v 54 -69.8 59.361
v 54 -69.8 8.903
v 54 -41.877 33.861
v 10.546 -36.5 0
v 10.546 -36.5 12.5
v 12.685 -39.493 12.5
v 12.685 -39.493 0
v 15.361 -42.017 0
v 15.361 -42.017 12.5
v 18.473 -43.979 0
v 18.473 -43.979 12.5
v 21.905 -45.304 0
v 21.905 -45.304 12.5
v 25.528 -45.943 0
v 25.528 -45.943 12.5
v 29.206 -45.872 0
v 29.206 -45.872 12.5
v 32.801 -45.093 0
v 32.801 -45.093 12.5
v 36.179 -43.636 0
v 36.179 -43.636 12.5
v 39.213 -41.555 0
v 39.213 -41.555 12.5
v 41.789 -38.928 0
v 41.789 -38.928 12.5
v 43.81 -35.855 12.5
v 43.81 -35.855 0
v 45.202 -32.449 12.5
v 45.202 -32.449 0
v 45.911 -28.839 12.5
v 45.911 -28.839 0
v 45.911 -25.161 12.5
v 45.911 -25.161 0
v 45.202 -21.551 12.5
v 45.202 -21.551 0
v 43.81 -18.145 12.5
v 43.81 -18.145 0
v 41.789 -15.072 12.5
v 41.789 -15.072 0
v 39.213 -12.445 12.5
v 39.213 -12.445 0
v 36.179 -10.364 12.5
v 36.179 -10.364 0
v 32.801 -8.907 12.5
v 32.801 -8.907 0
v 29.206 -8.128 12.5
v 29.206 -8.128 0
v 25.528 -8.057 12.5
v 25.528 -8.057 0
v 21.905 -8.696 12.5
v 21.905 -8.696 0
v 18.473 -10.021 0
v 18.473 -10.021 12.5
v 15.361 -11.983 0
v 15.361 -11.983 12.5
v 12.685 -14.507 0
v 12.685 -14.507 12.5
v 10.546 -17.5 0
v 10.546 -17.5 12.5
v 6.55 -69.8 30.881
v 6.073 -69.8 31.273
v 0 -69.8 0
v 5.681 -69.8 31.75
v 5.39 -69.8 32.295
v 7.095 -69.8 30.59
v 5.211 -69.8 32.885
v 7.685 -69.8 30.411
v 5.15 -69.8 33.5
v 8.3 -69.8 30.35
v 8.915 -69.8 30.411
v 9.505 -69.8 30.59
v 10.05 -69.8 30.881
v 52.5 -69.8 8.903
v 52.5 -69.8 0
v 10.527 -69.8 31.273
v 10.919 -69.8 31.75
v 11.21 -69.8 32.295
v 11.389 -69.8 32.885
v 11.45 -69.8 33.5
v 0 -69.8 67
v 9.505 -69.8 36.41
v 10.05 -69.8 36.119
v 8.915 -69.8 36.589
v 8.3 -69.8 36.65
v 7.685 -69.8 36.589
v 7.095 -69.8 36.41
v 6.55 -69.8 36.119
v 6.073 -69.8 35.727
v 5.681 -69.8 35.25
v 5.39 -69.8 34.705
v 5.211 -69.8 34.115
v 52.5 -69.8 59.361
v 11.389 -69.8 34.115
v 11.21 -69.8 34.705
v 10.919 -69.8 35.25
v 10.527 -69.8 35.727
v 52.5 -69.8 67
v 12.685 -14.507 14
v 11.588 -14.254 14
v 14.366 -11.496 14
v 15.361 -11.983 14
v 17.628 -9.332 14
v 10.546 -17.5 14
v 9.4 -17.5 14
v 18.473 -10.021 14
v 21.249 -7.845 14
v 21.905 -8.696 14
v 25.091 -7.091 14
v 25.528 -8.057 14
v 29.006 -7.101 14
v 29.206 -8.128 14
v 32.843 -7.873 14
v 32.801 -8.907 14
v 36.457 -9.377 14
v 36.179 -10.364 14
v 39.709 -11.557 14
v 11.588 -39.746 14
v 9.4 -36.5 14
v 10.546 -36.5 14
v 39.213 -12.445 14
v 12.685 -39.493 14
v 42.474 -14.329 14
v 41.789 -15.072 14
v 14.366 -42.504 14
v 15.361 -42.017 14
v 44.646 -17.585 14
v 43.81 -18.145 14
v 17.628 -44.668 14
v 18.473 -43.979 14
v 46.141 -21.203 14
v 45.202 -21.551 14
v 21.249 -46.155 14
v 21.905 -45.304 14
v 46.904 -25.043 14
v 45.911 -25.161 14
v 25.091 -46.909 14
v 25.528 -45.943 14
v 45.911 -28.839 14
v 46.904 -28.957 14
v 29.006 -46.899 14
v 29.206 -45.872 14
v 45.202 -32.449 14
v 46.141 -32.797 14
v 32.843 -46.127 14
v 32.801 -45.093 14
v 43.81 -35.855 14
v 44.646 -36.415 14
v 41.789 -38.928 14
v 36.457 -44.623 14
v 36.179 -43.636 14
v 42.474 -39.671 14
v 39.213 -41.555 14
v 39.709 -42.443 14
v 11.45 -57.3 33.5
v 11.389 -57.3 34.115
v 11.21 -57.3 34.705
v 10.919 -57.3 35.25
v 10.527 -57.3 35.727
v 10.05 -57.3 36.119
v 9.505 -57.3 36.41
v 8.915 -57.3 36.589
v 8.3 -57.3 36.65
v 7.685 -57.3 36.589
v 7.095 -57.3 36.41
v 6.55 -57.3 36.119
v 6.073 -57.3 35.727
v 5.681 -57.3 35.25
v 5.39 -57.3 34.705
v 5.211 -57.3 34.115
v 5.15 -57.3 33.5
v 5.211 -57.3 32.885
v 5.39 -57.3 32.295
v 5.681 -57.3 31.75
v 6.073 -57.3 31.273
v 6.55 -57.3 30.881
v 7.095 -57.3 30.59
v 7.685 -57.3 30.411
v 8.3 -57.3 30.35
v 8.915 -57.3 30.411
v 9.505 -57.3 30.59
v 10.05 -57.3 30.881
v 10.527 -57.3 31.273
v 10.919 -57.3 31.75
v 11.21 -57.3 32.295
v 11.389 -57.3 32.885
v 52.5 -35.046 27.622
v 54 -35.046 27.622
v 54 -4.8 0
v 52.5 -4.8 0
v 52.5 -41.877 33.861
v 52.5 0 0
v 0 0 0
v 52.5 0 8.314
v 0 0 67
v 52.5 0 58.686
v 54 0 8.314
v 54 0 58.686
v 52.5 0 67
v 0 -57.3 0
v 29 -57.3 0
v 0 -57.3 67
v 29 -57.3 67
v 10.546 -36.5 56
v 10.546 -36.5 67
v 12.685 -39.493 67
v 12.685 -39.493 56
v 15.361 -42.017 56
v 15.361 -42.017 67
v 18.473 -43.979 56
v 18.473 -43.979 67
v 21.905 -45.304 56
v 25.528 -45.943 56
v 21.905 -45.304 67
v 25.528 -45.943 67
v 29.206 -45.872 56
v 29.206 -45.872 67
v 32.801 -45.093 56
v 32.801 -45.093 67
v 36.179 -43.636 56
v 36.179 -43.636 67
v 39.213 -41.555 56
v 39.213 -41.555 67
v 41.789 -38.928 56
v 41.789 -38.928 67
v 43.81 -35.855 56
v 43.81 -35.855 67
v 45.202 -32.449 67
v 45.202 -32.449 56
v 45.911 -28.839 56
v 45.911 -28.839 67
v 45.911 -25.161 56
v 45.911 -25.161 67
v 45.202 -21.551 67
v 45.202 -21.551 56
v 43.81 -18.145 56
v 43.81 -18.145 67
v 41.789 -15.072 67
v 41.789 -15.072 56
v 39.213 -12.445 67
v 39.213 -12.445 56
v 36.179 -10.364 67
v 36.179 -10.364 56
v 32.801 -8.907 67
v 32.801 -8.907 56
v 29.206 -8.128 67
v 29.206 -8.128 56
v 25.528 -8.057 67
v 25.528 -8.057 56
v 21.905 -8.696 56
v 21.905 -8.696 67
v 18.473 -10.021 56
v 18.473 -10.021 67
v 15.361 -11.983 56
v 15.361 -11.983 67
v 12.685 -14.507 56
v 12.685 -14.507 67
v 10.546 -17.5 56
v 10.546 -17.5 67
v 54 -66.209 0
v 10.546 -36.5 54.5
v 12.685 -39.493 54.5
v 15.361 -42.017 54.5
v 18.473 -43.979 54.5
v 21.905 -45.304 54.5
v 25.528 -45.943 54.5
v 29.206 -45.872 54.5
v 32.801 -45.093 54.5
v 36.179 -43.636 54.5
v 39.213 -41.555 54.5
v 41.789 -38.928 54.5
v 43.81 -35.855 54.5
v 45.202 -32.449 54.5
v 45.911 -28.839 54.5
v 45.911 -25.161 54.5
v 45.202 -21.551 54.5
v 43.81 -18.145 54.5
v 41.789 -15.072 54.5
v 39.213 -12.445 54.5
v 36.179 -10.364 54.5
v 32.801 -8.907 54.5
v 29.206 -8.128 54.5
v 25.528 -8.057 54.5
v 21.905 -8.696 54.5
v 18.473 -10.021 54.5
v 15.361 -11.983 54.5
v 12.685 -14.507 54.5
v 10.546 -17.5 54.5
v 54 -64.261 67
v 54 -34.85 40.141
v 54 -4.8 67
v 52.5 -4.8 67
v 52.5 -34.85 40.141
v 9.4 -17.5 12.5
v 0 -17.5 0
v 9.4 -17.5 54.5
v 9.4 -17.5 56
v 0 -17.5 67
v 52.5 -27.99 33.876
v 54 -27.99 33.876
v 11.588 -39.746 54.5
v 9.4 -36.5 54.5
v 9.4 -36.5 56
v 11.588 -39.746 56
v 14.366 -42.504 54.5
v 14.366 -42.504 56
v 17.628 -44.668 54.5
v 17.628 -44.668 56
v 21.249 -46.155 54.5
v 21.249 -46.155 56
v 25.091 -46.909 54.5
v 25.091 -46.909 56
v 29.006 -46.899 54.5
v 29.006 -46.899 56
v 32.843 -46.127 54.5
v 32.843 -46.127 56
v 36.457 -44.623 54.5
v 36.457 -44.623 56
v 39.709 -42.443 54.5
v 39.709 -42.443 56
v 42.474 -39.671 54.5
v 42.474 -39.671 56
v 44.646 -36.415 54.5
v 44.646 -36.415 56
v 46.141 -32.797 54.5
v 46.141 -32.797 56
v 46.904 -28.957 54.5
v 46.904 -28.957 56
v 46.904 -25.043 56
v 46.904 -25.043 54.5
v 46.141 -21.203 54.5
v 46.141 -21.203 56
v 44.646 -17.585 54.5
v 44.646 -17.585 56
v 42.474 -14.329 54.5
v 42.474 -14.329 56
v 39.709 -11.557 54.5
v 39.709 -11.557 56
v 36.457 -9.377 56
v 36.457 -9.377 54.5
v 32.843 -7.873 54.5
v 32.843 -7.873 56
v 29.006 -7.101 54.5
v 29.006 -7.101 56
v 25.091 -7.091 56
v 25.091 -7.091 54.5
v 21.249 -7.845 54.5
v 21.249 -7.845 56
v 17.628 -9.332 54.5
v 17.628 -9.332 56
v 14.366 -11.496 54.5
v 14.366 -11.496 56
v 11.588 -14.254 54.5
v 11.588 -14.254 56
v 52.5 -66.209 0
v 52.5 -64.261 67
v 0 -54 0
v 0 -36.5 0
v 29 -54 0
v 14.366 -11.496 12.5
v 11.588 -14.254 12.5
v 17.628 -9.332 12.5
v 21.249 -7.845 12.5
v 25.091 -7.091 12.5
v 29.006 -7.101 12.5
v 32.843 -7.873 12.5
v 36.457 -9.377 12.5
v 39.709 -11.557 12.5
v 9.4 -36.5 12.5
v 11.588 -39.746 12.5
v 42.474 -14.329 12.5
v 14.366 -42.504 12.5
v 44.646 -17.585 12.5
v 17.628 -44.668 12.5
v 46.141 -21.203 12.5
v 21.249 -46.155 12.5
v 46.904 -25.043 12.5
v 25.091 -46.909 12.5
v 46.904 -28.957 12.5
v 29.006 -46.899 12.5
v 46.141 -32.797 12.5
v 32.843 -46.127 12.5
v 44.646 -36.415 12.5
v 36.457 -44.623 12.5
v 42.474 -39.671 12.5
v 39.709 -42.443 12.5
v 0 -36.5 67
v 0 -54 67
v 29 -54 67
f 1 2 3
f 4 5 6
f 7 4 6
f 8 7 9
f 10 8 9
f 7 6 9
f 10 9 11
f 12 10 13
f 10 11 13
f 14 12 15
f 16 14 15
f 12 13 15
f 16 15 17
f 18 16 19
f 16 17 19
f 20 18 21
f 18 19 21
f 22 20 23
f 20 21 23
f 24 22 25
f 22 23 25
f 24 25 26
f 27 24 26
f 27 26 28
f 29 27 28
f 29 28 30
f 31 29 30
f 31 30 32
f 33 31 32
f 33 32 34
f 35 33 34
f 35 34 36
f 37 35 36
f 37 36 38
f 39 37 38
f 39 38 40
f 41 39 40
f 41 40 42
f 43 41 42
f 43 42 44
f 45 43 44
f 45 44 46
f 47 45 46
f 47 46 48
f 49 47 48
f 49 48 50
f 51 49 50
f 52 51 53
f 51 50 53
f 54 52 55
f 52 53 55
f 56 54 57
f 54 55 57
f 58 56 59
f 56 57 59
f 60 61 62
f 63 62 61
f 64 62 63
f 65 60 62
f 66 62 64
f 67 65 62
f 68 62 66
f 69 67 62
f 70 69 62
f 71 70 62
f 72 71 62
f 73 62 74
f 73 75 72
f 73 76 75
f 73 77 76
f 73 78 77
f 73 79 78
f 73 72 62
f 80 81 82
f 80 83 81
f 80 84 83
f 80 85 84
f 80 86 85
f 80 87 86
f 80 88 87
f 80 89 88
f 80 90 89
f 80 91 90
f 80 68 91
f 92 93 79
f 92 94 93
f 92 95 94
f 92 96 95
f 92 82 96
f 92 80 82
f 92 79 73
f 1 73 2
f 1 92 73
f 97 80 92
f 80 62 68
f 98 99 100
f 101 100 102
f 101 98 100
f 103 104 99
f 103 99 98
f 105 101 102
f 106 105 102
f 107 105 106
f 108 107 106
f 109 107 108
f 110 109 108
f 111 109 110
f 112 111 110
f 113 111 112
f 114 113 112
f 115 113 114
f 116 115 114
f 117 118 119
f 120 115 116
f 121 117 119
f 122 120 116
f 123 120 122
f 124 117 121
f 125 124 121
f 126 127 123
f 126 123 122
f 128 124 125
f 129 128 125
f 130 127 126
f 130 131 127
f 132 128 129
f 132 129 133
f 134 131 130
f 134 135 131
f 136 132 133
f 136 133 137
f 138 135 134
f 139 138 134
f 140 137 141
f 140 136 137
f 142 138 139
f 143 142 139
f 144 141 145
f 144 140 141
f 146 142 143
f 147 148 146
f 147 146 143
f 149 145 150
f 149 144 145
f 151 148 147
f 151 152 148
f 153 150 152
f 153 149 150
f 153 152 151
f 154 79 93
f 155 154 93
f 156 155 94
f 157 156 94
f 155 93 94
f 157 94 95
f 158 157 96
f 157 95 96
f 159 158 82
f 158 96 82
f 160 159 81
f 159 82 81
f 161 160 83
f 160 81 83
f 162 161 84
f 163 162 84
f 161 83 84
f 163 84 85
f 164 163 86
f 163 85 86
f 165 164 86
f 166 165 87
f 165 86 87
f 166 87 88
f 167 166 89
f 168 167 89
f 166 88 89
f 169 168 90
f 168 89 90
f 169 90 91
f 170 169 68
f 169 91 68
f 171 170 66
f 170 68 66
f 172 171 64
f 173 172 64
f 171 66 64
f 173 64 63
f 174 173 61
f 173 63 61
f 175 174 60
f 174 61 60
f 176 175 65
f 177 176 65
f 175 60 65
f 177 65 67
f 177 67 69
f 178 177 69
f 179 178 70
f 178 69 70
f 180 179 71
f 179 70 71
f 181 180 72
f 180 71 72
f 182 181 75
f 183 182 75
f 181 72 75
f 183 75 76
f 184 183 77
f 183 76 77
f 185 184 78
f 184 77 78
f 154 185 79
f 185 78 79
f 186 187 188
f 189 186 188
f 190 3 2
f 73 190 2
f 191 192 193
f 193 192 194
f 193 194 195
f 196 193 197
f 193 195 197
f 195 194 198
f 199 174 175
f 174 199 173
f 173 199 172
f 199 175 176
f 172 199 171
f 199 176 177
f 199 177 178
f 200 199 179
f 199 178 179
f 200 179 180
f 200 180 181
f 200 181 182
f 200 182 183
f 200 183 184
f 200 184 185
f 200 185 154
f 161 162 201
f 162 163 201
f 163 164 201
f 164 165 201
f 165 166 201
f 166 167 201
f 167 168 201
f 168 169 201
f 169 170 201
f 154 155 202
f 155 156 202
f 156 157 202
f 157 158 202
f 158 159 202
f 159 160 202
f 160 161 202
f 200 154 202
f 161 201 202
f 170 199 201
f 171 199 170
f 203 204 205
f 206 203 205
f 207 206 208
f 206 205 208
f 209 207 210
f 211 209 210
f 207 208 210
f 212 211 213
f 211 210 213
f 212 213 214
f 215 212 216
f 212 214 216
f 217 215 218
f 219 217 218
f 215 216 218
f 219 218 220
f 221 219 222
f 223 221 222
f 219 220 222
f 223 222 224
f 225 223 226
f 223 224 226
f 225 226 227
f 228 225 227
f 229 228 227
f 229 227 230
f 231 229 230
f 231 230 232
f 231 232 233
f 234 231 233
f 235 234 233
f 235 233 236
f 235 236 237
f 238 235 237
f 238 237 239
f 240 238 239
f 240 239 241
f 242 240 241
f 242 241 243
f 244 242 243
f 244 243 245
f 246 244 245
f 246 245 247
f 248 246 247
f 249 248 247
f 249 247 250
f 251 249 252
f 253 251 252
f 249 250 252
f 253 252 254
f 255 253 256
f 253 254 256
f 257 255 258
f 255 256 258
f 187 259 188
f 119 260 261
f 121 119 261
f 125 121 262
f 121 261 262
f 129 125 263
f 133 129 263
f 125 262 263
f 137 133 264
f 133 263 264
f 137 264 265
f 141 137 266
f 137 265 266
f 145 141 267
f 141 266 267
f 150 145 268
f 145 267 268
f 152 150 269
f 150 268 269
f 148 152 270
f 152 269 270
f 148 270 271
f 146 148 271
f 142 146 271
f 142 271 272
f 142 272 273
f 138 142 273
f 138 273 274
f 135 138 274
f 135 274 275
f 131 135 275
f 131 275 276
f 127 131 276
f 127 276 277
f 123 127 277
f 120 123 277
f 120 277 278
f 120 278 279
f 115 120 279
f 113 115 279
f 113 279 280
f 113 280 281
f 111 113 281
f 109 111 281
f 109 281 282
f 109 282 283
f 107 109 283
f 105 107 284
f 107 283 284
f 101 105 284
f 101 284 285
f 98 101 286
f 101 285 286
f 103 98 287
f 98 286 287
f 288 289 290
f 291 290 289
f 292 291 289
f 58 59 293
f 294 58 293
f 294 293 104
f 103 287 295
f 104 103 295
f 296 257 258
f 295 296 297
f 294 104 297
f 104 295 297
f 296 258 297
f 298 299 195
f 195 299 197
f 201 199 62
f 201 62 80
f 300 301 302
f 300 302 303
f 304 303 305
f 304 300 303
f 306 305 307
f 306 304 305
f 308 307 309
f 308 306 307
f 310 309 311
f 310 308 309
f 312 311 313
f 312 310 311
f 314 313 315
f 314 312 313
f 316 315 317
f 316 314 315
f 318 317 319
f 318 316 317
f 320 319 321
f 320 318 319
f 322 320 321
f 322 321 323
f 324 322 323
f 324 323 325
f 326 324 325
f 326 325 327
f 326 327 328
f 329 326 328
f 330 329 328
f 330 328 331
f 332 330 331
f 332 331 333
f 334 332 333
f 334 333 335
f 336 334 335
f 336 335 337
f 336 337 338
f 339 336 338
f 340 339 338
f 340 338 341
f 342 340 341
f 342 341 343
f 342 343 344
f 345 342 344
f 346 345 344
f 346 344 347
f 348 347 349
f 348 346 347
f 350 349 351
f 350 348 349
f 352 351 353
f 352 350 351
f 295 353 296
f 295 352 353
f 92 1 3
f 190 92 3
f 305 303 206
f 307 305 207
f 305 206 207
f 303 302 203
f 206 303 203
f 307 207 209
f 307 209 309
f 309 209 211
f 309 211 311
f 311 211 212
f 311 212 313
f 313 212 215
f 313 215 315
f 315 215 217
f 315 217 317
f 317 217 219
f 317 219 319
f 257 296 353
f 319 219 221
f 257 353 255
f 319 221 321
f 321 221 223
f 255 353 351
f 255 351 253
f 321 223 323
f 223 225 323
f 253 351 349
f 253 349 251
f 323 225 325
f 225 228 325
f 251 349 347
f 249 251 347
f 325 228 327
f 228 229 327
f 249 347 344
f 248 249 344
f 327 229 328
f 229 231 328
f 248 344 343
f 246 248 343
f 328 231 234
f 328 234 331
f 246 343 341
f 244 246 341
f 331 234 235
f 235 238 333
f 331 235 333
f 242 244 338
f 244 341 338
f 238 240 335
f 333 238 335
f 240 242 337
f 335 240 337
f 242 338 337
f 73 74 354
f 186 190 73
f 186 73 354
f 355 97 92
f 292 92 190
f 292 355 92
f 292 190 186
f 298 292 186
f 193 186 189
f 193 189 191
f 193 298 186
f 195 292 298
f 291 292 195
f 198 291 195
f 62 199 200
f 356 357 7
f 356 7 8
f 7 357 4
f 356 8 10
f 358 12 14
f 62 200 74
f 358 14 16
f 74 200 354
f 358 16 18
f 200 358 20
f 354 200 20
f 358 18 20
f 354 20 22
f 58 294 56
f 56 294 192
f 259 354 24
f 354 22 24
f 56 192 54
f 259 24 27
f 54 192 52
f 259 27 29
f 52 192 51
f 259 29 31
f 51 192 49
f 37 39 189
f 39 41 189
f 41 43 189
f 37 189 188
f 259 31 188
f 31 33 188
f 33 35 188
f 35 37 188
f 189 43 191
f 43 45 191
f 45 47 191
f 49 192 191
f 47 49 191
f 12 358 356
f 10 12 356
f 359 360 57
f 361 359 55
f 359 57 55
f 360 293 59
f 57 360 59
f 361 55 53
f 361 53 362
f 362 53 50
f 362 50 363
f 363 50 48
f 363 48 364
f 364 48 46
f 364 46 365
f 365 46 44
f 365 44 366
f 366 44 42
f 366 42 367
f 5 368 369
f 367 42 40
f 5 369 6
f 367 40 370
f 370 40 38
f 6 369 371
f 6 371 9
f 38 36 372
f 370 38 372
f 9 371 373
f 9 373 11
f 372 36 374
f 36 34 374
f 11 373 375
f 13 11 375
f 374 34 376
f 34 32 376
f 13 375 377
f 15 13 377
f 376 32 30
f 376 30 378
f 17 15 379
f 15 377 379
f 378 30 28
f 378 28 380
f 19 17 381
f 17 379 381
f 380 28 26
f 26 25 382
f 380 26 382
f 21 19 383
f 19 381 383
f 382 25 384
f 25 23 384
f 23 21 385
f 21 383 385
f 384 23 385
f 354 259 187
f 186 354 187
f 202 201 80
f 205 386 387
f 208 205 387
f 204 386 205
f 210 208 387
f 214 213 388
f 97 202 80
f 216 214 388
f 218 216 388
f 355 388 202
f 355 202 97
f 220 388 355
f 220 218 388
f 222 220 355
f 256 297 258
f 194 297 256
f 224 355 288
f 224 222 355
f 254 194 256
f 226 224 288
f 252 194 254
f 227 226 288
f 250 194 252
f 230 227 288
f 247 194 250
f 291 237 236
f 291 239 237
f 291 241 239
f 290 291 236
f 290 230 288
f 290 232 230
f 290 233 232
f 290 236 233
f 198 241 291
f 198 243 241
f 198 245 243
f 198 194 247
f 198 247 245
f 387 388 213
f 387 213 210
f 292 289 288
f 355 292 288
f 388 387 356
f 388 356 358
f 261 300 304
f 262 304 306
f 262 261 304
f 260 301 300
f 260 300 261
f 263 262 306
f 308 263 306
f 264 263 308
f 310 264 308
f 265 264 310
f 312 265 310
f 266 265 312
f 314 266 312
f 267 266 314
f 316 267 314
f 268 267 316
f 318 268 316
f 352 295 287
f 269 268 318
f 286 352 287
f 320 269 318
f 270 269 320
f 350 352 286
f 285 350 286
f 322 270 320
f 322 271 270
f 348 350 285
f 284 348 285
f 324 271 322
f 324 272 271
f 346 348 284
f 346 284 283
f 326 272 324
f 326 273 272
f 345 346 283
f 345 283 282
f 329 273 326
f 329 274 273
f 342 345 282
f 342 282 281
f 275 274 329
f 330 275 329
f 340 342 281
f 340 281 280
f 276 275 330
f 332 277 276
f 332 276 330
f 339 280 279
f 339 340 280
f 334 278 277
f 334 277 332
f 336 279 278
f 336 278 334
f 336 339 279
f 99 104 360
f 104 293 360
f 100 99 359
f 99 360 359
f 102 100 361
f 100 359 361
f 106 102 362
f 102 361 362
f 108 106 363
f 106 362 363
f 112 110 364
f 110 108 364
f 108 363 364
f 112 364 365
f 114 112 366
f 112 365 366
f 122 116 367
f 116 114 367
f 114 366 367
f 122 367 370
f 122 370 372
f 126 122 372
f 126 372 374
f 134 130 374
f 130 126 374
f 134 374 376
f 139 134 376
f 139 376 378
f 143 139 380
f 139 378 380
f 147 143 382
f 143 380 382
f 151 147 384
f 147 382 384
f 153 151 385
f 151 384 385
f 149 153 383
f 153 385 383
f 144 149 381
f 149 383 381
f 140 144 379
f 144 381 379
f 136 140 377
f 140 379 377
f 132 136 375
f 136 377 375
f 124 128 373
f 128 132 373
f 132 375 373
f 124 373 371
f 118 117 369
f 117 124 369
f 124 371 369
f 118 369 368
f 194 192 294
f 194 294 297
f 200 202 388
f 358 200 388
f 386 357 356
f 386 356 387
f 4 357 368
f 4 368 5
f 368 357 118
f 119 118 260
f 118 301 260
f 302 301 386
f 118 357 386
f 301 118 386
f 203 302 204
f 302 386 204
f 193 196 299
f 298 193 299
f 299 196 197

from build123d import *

# Parameters (mm, degrees)
F0_W      = 54
F0_H      = 67
F1_DEPTH  = 69.8
F2_W      = 29
F2_H      = 3.3
F3_DEPTH  = 100
F5_DEPTH  = 1.5
F6_R      = 3.15
F7_DEPTH  = 12.5
F9_R      = 20
F10_DEPTH = 1.5
F12_R     = 20
F13_DEPTH = 1.5


with BuildPart() as f1:
    # F0 (on Front) → F1 (new body)
    with BuildSketch(Plane.XZ):
        with Locations((27, 33.5)):
            Rectangle(F0_W, F0_H)
    extrude(amount=F1_DEPTH)

    # F2 (on face) → F3 (cut)
    with BuildSketch(Plane.XY.offset(67)):
        with BuildLine():
            Line((0, -36.5), (10.5455173281, -36.5))
            ThreePointArc((10.5455173281, -36.5), (46, -27), (10.5455173281, -17.5))
            Line((10.5455173281, -17.5), (0, -17.5))
            Line((0, -17.5), (0, -36.5))
        make_face()
        with Locations((14.5, -55.65)):
            Rectangle(F2_W, F2_H)
    extrude(amount=-F3_DEPTH, mode=Mode.SUBTRACT)

    # F4 (on face) → F5 (cut)
    with BuildSketch(Plane.YZ.offset(54)):
        Polygon((-69.8, 67), (-69.8, 59.3613030854), (-41.876951199, 33.8605559632), (-69.8, 8.9028859511), (-69.8, 0), (-66.2085348753, 0), (-35.0458744522, 27.6220695453), (-4.8, 0), (0, 0), (0, 8.3138438763), (-27.9903035886, 33.8760114883), (0, 58.6861561237), (0, 67), (-4.8, 67), (-34.8503444482, 40.1409494059), (-64.2607212067, 67), align=None)
    extrude(amount=-F5_DEPTH, mode=Mode.SUBTRACT)

    # F6 (on face) → F7 (cut)
    with BuildSketch(Plane.XZ.offset(69.8)):
        with Locations((8.3, 33.5)):
            Circle(F6_R)
    extrude(amount=-F7_DEPTH, mode=Mode.SUBTRACT)

    # F9 (on offset) → F10 (cut)
    with BuildSketch(Plane.XY.offset(54.5)):
        with Locations((27, -27)):
            Circle(F9_R)
    extrude(amount=F10_DEPTH, mode=Mode.SUBTRACT)

    # F12 (on offset) → F13 (cut)
    with BuildSketch(Plane(origin=(0, 0, 12.5), x_dir=(1, 0, 0), z_dir=(0, 0, -1))):
        with Locations((27, 27)):
            Circle(F12_R)
    extrude(amount=-F13_DEPTH, mode=Mode.SUBTRACT)


solid = f1.part
